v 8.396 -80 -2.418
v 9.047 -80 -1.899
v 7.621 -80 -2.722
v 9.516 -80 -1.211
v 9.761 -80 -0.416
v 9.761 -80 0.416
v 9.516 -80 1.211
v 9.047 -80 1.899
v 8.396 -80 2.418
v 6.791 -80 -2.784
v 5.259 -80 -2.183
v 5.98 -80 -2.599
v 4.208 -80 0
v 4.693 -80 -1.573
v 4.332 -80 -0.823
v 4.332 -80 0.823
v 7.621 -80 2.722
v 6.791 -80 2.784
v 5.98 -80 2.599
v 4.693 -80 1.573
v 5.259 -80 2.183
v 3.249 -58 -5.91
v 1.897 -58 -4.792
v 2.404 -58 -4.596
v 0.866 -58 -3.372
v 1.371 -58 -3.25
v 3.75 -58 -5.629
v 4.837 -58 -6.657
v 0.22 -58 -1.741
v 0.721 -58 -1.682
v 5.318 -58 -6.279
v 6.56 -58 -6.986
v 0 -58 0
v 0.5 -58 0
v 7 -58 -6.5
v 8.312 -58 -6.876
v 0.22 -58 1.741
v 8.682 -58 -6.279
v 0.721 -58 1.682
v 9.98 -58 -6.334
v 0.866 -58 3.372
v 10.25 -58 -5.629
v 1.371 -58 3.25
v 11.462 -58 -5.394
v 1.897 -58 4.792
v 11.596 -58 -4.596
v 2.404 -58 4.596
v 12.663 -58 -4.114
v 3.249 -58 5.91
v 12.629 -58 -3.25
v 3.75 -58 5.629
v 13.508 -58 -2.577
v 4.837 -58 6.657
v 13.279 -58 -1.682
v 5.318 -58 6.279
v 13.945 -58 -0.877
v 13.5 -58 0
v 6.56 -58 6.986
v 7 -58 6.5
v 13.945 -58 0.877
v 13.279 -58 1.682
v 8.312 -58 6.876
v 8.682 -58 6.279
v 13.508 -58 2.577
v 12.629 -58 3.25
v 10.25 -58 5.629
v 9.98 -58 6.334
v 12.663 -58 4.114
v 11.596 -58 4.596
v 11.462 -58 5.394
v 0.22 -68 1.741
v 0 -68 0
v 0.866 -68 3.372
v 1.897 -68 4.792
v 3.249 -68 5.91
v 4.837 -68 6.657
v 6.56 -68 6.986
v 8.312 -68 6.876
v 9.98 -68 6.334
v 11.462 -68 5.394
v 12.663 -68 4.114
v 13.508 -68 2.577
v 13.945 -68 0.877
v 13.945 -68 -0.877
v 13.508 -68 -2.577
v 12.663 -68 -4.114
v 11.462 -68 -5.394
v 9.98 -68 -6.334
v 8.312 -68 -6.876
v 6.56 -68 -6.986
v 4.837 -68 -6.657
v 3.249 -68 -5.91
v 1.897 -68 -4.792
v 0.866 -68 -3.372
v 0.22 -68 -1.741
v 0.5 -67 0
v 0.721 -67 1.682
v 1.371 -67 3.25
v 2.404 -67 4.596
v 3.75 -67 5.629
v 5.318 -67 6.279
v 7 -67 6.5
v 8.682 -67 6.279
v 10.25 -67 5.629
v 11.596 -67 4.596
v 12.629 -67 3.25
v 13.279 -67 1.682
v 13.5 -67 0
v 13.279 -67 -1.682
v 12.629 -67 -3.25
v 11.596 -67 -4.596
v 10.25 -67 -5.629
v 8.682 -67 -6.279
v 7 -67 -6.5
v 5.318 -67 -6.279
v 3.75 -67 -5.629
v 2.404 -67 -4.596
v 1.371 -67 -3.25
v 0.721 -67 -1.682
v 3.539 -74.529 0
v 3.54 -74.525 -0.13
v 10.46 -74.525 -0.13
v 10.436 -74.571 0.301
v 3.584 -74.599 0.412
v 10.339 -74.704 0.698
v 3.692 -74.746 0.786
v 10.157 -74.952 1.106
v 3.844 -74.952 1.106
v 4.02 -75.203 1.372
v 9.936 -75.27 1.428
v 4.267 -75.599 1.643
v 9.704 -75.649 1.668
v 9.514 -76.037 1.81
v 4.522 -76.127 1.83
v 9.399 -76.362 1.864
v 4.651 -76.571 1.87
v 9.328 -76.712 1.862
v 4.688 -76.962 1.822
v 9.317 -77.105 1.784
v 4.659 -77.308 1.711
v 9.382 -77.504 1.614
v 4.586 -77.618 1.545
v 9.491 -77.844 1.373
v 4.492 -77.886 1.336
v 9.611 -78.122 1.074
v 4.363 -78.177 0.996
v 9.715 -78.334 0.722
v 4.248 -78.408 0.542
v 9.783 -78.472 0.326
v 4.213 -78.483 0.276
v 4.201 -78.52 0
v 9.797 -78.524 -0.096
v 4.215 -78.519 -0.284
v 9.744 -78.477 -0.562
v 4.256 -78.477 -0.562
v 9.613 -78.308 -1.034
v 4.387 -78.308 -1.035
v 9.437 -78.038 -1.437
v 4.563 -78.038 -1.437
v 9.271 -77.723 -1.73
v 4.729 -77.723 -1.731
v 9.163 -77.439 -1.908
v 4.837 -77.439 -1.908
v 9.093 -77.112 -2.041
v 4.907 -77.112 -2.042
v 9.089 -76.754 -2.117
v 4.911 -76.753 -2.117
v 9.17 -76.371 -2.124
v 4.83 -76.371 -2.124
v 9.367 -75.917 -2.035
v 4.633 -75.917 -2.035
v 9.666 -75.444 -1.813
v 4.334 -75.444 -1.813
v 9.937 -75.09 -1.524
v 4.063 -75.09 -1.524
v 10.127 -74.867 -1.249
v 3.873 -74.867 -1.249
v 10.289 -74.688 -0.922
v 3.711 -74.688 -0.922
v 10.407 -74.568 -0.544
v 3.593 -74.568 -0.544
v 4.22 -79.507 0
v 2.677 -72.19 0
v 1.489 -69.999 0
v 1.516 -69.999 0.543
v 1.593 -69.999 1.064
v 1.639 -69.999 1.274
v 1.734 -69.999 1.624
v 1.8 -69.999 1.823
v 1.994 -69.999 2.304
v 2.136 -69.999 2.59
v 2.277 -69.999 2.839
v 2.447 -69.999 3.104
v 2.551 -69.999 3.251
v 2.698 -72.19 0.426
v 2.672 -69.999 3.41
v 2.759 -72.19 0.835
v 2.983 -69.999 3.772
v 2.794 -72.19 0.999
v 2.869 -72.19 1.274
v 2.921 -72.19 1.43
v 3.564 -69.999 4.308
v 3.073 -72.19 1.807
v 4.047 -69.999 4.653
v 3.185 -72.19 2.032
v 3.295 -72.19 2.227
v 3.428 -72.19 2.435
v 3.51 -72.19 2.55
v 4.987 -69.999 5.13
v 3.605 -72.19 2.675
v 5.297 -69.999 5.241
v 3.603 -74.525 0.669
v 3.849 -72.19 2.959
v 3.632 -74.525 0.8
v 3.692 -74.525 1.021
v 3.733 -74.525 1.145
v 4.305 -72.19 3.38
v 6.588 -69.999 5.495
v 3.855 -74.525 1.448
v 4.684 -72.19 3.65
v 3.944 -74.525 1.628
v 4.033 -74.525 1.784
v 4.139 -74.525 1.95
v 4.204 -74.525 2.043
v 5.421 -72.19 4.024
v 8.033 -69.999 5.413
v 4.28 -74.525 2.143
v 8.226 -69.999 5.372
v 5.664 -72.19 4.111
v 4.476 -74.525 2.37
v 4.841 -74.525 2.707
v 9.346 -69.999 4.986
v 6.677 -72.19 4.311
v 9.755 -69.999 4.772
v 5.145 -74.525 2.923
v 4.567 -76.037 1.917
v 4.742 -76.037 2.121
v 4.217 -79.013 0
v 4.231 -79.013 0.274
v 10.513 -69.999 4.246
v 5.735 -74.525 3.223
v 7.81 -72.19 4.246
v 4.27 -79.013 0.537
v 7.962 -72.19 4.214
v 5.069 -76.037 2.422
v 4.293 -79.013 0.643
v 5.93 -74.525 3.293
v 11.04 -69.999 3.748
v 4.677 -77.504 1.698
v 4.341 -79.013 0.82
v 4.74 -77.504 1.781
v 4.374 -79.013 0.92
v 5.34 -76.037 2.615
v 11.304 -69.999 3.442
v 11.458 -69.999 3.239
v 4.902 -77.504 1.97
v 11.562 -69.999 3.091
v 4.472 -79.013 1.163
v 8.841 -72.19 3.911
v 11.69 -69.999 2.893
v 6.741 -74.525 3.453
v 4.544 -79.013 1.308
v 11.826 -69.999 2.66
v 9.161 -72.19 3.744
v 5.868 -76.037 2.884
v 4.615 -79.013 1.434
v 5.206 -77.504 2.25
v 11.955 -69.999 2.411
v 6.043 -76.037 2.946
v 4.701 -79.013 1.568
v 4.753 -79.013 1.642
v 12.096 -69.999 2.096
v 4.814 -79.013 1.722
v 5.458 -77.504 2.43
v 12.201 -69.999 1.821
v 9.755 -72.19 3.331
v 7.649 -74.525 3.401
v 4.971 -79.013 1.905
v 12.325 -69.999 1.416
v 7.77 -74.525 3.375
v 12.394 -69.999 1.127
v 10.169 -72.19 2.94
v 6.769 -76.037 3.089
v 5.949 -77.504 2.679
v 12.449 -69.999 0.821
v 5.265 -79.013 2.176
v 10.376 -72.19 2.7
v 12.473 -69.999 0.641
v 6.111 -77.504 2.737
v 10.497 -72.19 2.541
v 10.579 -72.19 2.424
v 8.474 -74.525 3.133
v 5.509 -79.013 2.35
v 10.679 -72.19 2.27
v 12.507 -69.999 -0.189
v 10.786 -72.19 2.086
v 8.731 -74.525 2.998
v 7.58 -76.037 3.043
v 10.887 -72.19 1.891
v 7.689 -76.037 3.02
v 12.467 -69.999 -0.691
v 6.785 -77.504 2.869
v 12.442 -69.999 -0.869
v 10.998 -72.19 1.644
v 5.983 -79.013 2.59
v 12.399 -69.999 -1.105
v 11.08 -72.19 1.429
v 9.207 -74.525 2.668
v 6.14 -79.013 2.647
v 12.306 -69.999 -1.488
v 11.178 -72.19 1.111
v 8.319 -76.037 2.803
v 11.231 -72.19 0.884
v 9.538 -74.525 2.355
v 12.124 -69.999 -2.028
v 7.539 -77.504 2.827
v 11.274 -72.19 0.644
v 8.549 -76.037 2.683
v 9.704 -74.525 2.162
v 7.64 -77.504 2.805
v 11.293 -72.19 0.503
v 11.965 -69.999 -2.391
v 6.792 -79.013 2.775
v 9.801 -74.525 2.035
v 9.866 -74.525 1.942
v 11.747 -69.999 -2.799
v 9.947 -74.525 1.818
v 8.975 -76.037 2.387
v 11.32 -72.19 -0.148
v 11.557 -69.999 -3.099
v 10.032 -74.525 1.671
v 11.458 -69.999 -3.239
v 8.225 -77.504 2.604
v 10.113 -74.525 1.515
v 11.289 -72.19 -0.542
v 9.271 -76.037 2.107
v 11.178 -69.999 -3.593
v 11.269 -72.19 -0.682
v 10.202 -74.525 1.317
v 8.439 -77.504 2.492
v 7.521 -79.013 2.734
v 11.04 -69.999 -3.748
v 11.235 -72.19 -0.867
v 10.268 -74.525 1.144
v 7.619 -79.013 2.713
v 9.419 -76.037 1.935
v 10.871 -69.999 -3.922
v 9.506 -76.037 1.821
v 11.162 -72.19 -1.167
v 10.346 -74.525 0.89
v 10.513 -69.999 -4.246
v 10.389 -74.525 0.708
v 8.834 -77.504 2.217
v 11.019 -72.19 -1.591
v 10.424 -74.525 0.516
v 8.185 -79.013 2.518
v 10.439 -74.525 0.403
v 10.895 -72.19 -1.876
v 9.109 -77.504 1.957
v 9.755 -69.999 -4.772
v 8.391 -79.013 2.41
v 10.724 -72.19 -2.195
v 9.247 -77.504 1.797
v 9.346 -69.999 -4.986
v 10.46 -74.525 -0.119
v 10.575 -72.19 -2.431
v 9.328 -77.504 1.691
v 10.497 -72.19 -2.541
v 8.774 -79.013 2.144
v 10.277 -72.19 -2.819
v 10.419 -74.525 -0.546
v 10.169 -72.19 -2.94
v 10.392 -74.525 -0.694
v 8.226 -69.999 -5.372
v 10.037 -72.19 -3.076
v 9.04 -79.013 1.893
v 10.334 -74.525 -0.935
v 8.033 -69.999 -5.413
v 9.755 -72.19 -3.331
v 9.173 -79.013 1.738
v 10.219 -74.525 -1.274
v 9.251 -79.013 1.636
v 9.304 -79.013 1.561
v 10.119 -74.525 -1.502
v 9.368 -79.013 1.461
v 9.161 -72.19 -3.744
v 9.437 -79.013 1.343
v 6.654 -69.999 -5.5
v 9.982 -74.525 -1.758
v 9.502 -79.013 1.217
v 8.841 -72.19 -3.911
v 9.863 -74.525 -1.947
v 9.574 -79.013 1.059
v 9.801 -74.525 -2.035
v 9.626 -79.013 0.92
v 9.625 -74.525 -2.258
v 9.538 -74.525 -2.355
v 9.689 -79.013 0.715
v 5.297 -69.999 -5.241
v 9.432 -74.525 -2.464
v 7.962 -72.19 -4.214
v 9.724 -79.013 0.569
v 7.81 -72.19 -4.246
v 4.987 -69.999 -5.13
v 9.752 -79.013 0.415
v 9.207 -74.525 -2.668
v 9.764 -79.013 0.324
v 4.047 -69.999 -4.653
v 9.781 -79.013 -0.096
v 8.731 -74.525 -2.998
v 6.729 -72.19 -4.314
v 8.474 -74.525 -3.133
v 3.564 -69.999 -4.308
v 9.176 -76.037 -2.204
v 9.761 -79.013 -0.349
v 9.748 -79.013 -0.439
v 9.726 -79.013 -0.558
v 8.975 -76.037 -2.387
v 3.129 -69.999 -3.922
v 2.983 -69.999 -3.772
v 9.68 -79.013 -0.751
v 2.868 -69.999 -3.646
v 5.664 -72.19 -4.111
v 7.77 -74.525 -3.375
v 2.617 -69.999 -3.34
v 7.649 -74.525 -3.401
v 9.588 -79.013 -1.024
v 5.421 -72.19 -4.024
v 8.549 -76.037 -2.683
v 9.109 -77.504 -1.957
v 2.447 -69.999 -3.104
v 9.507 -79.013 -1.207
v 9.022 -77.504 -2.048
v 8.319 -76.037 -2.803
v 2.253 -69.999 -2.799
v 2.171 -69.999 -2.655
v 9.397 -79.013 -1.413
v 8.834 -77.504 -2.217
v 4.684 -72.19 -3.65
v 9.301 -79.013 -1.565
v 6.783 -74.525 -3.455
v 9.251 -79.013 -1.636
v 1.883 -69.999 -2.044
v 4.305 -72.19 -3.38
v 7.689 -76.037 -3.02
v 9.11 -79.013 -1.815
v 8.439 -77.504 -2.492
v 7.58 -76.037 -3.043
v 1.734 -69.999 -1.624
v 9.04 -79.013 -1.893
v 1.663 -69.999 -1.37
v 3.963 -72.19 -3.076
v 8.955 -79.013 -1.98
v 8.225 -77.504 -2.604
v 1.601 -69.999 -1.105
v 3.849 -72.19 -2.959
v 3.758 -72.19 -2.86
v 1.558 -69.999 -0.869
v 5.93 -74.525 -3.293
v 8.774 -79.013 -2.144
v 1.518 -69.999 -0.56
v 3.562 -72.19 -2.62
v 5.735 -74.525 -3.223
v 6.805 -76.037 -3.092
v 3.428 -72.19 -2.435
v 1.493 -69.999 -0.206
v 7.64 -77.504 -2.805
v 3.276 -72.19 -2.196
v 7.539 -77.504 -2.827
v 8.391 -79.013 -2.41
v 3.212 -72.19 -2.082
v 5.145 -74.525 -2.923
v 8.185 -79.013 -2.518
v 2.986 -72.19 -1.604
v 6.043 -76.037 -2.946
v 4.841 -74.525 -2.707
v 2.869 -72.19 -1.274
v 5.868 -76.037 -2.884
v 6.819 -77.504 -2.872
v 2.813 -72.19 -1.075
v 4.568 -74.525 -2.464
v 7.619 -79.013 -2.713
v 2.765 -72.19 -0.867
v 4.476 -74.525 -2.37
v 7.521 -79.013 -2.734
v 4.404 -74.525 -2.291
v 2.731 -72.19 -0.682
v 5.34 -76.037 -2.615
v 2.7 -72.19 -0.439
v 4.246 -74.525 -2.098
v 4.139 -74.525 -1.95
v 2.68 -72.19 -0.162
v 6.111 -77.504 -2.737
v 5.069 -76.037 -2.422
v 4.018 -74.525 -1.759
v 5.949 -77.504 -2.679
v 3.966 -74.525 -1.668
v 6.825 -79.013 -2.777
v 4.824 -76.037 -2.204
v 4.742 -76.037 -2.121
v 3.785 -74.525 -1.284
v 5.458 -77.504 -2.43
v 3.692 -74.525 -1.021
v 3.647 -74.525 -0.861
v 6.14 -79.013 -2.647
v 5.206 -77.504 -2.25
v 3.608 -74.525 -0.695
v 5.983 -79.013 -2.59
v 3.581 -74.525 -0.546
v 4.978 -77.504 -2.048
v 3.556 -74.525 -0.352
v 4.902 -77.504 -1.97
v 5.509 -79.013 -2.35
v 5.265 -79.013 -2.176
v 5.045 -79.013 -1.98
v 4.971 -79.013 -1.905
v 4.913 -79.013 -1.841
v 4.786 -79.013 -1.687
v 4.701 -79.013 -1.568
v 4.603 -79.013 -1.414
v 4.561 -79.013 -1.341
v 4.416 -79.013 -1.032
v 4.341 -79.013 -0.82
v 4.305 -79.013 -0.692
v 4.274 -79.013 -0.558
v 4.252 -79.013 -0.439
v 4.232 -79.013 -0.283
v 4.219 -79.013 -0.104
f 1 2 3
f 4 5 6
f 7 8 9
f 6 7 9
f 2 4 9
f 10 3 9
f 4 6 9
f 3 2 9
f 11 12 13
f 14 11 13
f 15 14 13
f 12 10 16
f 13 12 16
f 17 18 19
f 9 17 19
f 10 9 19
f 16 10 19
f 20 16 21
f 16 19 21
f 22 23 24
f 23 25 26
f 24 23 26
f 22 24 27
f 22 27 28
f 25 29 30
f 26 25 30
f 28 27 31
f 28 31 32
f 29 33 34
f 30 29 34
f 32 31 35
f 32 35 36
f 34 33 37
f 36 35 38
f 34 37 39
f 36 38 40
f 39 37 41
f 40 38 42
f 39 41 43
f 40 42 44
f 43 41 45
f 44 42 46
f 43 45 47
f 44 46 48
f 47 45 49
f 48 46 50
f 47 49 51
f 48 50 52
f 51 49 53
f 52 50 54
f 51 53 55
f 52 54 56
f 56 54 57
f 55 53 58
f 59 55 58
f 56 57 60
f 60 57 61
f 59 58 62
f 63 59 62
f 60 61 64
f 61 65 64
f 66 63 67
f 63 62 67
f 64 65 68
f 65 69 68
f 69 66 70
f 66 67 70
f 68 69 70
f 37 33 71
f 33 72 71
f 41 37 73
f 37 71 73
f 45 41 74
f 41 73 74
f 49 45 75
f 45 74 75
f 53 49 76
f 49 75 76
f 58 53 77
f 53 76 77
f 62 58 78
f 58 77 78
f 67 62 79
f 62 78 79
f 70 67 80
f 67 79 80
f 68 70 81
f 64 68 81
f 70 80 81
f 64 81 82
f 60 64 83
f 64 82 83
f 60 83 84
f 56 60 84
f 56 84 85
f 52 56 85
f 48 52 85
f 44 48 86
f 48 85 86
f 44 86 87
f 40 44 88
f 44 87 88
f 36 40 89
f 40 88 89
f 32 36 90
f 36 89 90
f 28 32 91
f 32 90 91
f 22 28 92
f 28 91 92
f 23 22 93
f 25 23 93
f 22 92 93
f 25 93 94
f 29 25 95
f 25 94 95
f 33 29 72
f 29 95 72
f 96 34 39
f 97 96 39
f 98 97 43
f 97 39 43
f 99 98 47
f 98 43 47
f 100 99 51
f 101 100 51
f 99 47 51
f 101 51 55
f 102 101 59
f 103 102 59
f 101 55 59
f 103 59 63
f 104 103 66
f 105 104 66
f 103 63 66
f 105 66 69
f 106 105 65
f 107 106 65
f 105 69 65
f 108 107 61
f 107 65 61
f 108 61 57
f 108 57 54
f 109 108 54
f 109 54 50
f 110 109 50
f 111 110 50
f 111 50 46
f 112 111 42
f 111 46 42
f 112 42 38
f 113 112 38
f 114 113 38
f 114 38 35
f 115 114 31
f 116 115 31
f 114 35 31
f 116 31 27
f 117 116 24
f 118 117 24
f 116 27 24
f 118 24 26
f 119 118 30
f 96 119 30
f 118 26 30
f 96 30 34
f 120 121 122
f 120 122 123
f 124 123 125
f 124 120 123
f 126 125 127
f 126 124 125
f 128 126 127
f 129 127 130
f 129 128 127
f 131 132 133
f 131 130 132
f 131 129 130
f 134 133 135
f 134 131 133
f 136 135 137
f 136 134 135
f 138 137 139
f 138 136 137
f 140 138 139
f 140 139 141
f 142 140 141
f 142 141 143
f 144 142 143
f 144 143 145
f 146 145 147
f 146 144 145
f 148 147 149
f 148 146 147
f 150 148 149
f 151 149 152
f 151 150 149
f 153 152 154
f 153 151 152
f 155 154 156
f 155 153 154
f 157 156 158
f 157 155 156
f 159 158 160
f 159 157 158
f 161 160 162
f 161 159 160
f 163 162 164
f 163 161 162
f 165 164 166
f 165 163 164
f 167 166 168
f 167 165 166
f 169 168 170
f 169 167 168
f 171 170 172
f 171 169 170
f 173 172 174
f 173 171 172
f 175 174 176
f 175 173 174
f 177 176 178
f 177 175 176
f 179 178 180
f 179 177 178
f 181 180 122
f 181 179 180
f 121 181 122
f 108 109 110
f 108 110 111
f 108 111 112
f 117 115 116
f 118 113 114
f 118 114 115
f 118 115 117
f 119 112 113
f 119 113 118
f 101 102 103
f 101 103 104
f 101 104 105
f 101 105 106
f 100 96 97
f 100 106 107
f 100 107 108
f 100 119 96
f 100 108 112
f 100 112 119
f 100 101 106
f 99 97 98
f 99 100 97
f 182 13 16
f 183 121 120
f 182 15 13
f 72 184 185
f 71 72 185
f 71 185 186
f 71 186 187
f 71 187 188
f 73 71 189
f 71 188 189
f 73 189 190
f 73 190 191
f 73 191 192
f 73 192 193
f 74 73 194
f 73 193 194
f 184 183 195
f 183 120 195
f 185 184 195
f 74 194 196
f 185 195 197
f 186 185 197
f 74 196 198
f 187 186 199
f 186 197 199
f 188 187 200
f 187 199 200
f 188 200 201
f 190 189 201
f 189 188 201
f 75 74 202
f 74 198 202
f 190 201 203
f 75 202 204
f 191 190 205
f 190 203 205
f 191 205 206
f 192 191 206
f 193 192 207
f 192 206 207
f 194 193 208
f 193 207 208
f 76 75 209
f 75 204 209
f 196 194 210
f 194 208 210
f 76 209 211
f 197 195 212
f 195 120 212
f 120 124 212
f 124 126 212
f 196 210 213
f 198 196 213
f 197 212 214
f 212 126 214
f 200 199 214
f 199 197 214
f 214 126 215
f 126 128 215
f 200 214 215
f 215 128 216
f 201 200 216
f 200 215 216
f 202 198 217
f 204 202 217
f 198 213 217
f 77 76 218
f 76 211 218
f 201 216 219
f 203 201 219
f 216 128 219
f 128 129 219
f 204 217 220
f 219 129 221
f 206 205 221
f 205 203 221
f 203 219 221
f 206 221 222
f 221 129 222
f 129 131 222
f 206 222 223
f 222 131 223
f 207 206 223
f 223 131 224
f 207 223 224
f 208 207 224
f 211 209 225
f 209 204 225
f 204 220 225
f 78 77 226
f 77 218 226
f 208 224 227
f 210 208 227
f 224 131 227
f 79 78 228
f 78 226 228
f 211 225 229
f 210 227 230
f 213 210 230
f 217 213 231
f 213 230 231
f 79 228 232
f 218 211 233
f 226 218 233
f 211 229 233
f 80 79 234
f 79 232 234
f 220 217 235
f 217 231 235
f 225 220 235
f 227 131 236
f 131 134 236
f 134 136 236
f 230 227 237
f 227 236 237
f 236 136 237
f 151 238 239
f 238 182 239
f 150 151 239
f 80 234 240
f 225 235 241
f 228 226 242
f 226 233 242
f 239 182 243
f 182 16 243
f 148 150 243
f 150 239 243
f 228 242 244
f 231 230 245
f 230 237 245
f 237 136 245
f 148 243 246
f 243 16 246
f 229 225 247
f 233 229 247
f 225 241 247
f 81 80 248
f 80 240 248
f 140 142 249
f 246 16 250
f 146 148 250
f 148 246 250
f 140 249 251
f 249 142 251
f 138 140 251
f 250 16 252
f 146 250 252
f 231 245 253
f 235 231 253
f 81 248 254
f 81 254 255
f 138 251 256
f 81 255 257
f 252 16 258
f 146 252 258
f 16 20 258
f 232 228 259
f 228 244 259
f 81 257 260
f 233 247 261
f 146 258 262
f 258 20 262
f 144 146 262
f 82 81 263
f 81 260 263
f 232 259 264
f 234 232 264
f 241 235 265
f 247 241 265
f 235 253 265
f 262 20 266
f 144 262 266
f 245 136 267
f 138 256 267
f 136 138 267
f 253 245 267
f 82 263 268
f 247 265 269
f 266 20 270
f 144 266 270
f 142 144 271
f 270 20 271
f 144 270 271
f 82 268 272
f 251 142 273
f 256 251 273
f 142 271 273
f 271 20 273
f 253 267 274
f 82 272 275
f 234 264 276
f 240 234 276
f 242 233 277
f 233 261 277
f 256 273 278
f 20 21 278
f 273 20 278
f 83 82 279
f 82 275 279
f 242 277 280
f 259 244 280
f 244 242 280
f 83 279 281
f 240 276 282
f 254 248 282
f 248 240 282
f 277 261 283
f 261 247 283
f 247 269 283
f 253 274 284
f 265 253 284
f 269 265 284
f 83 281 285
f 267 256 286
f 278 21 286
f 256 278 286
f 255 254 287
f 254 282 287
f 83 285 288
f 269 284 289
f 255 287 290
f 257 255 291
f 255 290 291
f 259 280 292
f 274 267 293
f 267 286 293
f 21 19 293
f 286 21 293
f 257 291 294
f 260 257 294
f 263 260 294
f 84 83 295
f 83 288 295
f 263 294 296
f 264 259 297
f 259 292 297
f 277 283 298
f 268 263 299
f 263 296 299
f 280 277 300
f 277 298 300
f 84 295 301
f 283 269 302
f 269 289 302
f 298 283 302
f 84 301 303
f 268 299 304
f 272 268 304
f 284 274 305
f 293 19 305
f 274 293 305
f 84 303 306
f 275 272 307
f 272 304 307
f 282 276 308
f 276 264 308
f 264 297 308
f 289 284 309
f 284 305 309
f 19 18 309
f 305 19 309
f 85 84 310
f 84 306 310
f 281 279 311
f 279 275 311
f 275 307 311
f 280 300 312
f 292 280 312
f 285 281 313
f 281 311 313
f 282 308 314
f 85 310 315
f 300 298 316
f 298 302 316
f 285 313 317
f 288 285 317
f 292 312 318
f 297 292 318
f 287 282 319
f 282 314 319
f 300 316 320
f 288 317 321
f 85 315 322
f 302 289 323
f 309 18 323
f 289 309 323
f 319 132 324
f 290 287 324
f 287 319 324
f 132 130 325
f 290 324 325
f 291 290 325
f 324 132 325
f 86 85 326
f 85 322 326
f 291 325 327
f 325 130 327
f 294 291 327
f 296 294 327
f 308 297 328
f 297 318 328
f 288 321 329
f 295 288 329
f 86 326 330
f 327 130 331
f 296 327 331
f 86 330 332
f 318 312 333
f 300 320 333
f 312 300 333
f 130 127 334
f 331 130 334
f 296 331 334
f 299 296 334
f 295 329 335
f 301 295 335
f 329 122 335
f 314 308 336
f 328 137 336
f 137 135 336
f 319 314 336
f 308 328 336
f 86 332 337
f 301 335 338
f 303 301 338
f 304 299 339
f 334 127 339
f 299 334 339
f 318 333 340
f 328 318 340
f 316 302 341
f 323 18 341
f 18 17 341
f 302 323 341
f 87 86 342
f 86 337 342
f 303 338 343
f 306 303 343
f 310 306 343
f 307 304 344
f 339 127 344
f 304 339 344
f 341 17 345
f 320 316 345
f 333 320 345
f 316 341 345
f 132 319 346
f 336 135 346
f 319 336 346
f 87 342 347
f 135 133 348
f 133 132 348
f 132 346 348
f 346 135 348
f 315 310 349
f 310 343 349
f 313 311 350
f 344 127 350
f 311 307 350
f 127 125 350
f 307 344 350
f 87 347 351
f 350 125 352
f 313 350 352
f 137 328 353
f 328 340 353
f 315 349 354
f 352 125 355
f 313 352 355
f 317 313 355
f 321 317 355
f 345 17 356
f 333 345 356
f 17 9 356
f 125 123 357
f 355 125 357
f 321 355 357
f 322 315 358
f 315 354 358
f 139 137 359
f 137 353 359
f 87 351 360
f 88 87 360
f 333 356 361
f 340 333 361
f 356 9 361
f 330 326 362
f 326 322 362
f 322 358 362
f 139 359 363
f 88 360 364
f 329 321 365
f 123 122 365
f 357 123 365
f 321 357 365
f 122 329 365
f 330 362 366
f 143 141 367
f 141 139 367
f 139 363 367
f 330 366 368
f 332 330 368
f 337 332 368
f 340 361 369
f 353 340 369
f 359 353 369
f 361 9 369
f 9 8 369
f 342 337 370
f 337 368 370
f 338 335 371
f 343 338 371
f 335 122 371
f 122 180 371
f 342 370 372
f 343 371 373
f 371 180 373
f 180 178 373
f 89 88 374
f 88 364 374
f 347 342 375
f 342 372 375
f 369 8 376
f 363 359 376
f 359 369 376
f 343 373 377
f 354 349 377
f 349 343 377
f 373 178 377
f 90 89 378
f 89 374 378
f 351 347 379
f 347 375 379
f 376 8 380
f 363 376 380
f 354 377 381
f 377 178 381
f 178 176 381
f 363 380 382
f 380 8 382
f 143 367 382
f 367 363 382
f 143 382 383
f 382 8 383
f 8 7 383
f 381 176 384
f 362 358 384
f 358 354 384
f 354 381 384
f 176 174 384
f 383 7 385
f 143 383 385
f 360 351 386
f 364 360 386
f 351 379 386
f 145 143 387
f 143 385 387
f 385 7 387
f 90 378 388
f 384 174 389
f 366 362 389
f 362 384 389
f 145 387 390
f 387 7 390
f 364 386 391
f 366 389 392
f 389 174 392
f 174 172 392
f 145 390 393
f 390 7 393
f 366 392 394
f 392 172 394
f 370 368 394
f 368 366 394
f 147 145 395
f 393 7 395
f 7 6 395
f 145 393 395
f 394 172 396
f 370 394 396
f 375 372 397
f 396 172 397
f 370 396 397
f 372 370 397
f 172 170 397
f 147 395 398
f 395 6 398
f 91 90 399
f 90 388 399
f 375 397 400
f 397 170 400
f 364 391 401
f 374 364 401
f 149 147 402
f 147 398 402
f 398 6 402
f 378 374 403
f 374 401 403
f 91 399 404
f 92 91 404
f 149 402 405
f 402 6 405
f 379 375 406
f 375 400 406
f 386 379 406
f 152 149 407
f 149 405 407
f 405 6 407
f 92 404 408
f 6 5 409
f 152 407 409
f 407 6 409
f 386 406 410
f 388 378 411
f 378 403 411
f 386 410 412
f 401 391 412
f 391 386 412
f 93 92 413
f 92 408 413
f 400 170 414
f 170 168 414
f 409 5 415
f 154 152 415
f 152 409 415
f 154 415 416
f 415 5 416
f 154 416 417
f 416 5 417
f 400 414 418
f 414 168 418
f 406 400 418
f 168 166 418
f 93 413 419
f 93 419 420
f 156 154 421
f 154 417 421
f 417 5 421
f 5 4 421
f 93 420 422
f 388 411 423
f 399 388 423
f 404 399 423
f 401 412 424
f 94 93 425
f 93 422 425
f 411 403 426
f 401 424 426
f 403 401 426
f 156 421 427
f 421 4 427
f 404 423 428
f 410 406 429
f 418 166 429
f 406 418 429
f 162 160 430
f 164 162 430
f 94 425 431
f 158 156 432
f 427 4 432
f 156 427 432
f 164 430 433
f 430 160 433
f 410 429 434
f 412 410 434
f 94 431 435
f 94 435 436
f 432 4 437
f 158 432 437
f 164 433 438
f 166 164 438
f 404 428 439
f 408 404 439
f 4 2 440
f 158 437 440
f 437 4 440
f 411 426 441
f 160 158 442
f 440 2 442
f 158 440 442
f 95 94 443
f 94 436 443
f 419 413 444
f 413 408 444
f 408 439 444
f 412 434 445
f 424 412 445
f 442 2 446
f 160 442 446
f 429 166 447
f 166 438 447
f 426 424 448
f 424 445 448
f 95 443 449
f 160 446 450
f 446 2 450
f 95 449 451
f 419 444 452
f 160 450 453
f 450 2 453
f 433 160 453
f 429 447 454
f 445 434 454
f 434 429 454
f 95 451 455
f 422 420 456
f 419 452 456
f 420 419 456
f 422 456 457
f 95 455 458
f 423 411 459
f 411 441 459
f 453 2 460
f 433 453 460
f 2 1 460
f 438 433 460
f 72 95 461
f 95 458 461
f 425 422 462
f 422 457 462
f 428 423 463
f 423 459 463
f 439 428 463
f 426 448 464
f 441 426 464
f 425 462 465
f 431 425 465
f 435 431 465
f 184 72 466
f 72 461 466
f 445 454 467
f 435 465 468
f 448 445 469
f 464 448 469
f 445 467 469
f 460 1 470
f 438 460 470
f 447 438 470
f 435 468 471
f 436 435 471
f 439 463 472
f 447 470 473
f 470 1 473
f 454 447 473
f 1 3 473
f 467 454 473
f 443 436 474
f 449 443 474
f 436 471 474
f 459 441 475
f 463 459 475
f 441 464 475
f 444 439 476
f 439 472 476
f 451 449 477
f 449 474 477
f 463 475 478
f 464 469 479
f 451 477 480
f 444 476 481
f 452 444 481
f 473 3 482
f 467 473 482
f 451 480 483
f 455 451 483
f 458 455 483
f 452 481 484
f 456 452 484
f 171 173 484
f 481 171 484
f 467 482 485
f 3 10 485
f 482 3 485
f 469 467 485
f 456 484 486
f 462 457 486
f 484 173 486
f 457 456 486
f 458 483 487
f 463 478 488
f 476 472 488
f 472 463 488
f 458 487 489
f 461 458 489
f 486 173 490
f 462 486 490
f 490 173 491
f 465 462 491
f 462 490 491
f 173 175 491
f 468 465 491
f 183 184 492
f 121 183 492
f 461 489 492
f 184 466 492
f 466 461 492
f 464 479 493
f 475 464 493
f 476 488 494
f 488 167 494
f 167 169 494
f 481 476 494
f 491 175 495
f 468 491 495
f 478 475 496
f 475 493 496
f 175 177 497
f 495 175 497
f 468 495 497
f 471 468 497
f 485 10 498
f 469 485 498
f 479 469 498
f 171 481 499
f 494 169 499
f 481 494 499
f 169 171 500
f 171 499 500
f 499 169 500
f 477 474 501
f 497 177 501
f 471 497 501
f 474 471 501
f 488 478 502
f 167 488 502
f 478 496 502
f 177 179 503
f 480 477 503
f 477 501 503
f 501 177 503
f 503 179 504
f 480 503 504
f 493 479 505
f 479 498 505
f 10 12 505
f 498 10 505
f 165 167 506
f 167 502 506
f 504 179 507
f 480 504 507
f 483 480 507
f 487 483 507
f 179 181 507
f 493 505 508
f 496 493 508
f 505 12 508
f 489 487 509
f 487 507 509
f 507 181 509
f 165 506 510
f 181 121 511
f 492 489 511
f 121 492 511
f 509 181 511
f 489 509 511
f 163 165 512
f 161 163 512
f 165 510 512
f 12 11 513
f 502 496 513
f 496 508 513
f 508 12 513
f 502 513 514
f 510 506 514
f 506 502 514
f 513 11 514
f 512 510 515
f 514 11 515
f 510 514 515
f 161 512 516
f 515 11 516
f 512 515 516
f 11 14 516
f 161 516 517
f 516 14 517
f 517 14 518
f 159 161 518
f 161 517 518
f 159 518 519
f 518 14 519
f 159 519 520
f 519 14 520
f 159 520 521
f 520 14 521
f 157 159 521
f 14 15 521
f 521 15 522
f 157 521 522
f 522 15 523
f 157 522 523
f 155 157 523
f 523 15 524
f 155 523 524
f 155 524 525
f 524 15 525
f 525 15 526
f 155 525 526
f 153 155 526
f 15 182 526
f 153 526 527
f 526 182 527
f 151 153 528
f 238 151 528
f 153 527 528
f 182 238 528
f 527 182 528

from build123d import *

# Parameters (mm, degrees)
F2_R     = 2
F3_DEPTH = 25.4
F4_R     = 6.5
F5_DEPTH = 9


with BuildPart() as f1:
    # F0 (on Top) → F1 (revolve)
    with BuildSketch(Plane.XY):
        with BuildLine():
            Line((0, -58), (0, -68))
            ThreePointArc((0, -68), (3.242526, -73.600747), (4.207879, -80))
            Line((4.207879, -80), (7, -80))
            Line((7, -80), (7, -58))
            Line((7, -58), (0, -58))
        make_face()
    revolve(axis=Axis((7, -68.5, 0), (0, 1, 0)))

    # F2 (on Right) → F3 (cut)
    with BuildSketch(Plane.YZ):
        with Locations((-76.524546, -0.129668)):
            Circle(F2_R)
    extrude(amount=F3_DEPTH, mode=Mode.SUBTRACT)

    # F4 (on face) → F5 (cut)
    with BuildSketch(Plane(origin=(0, -58, 0), x_dir=(-1, 0, 0), z_dir=(0, 1, 0))):
        with Locations((-7, 0)):
            Circle(F4_R)
    extrude(amount=-F5_DEPTH, mode=Mode.SUBTRACT)


solid = f1.part
